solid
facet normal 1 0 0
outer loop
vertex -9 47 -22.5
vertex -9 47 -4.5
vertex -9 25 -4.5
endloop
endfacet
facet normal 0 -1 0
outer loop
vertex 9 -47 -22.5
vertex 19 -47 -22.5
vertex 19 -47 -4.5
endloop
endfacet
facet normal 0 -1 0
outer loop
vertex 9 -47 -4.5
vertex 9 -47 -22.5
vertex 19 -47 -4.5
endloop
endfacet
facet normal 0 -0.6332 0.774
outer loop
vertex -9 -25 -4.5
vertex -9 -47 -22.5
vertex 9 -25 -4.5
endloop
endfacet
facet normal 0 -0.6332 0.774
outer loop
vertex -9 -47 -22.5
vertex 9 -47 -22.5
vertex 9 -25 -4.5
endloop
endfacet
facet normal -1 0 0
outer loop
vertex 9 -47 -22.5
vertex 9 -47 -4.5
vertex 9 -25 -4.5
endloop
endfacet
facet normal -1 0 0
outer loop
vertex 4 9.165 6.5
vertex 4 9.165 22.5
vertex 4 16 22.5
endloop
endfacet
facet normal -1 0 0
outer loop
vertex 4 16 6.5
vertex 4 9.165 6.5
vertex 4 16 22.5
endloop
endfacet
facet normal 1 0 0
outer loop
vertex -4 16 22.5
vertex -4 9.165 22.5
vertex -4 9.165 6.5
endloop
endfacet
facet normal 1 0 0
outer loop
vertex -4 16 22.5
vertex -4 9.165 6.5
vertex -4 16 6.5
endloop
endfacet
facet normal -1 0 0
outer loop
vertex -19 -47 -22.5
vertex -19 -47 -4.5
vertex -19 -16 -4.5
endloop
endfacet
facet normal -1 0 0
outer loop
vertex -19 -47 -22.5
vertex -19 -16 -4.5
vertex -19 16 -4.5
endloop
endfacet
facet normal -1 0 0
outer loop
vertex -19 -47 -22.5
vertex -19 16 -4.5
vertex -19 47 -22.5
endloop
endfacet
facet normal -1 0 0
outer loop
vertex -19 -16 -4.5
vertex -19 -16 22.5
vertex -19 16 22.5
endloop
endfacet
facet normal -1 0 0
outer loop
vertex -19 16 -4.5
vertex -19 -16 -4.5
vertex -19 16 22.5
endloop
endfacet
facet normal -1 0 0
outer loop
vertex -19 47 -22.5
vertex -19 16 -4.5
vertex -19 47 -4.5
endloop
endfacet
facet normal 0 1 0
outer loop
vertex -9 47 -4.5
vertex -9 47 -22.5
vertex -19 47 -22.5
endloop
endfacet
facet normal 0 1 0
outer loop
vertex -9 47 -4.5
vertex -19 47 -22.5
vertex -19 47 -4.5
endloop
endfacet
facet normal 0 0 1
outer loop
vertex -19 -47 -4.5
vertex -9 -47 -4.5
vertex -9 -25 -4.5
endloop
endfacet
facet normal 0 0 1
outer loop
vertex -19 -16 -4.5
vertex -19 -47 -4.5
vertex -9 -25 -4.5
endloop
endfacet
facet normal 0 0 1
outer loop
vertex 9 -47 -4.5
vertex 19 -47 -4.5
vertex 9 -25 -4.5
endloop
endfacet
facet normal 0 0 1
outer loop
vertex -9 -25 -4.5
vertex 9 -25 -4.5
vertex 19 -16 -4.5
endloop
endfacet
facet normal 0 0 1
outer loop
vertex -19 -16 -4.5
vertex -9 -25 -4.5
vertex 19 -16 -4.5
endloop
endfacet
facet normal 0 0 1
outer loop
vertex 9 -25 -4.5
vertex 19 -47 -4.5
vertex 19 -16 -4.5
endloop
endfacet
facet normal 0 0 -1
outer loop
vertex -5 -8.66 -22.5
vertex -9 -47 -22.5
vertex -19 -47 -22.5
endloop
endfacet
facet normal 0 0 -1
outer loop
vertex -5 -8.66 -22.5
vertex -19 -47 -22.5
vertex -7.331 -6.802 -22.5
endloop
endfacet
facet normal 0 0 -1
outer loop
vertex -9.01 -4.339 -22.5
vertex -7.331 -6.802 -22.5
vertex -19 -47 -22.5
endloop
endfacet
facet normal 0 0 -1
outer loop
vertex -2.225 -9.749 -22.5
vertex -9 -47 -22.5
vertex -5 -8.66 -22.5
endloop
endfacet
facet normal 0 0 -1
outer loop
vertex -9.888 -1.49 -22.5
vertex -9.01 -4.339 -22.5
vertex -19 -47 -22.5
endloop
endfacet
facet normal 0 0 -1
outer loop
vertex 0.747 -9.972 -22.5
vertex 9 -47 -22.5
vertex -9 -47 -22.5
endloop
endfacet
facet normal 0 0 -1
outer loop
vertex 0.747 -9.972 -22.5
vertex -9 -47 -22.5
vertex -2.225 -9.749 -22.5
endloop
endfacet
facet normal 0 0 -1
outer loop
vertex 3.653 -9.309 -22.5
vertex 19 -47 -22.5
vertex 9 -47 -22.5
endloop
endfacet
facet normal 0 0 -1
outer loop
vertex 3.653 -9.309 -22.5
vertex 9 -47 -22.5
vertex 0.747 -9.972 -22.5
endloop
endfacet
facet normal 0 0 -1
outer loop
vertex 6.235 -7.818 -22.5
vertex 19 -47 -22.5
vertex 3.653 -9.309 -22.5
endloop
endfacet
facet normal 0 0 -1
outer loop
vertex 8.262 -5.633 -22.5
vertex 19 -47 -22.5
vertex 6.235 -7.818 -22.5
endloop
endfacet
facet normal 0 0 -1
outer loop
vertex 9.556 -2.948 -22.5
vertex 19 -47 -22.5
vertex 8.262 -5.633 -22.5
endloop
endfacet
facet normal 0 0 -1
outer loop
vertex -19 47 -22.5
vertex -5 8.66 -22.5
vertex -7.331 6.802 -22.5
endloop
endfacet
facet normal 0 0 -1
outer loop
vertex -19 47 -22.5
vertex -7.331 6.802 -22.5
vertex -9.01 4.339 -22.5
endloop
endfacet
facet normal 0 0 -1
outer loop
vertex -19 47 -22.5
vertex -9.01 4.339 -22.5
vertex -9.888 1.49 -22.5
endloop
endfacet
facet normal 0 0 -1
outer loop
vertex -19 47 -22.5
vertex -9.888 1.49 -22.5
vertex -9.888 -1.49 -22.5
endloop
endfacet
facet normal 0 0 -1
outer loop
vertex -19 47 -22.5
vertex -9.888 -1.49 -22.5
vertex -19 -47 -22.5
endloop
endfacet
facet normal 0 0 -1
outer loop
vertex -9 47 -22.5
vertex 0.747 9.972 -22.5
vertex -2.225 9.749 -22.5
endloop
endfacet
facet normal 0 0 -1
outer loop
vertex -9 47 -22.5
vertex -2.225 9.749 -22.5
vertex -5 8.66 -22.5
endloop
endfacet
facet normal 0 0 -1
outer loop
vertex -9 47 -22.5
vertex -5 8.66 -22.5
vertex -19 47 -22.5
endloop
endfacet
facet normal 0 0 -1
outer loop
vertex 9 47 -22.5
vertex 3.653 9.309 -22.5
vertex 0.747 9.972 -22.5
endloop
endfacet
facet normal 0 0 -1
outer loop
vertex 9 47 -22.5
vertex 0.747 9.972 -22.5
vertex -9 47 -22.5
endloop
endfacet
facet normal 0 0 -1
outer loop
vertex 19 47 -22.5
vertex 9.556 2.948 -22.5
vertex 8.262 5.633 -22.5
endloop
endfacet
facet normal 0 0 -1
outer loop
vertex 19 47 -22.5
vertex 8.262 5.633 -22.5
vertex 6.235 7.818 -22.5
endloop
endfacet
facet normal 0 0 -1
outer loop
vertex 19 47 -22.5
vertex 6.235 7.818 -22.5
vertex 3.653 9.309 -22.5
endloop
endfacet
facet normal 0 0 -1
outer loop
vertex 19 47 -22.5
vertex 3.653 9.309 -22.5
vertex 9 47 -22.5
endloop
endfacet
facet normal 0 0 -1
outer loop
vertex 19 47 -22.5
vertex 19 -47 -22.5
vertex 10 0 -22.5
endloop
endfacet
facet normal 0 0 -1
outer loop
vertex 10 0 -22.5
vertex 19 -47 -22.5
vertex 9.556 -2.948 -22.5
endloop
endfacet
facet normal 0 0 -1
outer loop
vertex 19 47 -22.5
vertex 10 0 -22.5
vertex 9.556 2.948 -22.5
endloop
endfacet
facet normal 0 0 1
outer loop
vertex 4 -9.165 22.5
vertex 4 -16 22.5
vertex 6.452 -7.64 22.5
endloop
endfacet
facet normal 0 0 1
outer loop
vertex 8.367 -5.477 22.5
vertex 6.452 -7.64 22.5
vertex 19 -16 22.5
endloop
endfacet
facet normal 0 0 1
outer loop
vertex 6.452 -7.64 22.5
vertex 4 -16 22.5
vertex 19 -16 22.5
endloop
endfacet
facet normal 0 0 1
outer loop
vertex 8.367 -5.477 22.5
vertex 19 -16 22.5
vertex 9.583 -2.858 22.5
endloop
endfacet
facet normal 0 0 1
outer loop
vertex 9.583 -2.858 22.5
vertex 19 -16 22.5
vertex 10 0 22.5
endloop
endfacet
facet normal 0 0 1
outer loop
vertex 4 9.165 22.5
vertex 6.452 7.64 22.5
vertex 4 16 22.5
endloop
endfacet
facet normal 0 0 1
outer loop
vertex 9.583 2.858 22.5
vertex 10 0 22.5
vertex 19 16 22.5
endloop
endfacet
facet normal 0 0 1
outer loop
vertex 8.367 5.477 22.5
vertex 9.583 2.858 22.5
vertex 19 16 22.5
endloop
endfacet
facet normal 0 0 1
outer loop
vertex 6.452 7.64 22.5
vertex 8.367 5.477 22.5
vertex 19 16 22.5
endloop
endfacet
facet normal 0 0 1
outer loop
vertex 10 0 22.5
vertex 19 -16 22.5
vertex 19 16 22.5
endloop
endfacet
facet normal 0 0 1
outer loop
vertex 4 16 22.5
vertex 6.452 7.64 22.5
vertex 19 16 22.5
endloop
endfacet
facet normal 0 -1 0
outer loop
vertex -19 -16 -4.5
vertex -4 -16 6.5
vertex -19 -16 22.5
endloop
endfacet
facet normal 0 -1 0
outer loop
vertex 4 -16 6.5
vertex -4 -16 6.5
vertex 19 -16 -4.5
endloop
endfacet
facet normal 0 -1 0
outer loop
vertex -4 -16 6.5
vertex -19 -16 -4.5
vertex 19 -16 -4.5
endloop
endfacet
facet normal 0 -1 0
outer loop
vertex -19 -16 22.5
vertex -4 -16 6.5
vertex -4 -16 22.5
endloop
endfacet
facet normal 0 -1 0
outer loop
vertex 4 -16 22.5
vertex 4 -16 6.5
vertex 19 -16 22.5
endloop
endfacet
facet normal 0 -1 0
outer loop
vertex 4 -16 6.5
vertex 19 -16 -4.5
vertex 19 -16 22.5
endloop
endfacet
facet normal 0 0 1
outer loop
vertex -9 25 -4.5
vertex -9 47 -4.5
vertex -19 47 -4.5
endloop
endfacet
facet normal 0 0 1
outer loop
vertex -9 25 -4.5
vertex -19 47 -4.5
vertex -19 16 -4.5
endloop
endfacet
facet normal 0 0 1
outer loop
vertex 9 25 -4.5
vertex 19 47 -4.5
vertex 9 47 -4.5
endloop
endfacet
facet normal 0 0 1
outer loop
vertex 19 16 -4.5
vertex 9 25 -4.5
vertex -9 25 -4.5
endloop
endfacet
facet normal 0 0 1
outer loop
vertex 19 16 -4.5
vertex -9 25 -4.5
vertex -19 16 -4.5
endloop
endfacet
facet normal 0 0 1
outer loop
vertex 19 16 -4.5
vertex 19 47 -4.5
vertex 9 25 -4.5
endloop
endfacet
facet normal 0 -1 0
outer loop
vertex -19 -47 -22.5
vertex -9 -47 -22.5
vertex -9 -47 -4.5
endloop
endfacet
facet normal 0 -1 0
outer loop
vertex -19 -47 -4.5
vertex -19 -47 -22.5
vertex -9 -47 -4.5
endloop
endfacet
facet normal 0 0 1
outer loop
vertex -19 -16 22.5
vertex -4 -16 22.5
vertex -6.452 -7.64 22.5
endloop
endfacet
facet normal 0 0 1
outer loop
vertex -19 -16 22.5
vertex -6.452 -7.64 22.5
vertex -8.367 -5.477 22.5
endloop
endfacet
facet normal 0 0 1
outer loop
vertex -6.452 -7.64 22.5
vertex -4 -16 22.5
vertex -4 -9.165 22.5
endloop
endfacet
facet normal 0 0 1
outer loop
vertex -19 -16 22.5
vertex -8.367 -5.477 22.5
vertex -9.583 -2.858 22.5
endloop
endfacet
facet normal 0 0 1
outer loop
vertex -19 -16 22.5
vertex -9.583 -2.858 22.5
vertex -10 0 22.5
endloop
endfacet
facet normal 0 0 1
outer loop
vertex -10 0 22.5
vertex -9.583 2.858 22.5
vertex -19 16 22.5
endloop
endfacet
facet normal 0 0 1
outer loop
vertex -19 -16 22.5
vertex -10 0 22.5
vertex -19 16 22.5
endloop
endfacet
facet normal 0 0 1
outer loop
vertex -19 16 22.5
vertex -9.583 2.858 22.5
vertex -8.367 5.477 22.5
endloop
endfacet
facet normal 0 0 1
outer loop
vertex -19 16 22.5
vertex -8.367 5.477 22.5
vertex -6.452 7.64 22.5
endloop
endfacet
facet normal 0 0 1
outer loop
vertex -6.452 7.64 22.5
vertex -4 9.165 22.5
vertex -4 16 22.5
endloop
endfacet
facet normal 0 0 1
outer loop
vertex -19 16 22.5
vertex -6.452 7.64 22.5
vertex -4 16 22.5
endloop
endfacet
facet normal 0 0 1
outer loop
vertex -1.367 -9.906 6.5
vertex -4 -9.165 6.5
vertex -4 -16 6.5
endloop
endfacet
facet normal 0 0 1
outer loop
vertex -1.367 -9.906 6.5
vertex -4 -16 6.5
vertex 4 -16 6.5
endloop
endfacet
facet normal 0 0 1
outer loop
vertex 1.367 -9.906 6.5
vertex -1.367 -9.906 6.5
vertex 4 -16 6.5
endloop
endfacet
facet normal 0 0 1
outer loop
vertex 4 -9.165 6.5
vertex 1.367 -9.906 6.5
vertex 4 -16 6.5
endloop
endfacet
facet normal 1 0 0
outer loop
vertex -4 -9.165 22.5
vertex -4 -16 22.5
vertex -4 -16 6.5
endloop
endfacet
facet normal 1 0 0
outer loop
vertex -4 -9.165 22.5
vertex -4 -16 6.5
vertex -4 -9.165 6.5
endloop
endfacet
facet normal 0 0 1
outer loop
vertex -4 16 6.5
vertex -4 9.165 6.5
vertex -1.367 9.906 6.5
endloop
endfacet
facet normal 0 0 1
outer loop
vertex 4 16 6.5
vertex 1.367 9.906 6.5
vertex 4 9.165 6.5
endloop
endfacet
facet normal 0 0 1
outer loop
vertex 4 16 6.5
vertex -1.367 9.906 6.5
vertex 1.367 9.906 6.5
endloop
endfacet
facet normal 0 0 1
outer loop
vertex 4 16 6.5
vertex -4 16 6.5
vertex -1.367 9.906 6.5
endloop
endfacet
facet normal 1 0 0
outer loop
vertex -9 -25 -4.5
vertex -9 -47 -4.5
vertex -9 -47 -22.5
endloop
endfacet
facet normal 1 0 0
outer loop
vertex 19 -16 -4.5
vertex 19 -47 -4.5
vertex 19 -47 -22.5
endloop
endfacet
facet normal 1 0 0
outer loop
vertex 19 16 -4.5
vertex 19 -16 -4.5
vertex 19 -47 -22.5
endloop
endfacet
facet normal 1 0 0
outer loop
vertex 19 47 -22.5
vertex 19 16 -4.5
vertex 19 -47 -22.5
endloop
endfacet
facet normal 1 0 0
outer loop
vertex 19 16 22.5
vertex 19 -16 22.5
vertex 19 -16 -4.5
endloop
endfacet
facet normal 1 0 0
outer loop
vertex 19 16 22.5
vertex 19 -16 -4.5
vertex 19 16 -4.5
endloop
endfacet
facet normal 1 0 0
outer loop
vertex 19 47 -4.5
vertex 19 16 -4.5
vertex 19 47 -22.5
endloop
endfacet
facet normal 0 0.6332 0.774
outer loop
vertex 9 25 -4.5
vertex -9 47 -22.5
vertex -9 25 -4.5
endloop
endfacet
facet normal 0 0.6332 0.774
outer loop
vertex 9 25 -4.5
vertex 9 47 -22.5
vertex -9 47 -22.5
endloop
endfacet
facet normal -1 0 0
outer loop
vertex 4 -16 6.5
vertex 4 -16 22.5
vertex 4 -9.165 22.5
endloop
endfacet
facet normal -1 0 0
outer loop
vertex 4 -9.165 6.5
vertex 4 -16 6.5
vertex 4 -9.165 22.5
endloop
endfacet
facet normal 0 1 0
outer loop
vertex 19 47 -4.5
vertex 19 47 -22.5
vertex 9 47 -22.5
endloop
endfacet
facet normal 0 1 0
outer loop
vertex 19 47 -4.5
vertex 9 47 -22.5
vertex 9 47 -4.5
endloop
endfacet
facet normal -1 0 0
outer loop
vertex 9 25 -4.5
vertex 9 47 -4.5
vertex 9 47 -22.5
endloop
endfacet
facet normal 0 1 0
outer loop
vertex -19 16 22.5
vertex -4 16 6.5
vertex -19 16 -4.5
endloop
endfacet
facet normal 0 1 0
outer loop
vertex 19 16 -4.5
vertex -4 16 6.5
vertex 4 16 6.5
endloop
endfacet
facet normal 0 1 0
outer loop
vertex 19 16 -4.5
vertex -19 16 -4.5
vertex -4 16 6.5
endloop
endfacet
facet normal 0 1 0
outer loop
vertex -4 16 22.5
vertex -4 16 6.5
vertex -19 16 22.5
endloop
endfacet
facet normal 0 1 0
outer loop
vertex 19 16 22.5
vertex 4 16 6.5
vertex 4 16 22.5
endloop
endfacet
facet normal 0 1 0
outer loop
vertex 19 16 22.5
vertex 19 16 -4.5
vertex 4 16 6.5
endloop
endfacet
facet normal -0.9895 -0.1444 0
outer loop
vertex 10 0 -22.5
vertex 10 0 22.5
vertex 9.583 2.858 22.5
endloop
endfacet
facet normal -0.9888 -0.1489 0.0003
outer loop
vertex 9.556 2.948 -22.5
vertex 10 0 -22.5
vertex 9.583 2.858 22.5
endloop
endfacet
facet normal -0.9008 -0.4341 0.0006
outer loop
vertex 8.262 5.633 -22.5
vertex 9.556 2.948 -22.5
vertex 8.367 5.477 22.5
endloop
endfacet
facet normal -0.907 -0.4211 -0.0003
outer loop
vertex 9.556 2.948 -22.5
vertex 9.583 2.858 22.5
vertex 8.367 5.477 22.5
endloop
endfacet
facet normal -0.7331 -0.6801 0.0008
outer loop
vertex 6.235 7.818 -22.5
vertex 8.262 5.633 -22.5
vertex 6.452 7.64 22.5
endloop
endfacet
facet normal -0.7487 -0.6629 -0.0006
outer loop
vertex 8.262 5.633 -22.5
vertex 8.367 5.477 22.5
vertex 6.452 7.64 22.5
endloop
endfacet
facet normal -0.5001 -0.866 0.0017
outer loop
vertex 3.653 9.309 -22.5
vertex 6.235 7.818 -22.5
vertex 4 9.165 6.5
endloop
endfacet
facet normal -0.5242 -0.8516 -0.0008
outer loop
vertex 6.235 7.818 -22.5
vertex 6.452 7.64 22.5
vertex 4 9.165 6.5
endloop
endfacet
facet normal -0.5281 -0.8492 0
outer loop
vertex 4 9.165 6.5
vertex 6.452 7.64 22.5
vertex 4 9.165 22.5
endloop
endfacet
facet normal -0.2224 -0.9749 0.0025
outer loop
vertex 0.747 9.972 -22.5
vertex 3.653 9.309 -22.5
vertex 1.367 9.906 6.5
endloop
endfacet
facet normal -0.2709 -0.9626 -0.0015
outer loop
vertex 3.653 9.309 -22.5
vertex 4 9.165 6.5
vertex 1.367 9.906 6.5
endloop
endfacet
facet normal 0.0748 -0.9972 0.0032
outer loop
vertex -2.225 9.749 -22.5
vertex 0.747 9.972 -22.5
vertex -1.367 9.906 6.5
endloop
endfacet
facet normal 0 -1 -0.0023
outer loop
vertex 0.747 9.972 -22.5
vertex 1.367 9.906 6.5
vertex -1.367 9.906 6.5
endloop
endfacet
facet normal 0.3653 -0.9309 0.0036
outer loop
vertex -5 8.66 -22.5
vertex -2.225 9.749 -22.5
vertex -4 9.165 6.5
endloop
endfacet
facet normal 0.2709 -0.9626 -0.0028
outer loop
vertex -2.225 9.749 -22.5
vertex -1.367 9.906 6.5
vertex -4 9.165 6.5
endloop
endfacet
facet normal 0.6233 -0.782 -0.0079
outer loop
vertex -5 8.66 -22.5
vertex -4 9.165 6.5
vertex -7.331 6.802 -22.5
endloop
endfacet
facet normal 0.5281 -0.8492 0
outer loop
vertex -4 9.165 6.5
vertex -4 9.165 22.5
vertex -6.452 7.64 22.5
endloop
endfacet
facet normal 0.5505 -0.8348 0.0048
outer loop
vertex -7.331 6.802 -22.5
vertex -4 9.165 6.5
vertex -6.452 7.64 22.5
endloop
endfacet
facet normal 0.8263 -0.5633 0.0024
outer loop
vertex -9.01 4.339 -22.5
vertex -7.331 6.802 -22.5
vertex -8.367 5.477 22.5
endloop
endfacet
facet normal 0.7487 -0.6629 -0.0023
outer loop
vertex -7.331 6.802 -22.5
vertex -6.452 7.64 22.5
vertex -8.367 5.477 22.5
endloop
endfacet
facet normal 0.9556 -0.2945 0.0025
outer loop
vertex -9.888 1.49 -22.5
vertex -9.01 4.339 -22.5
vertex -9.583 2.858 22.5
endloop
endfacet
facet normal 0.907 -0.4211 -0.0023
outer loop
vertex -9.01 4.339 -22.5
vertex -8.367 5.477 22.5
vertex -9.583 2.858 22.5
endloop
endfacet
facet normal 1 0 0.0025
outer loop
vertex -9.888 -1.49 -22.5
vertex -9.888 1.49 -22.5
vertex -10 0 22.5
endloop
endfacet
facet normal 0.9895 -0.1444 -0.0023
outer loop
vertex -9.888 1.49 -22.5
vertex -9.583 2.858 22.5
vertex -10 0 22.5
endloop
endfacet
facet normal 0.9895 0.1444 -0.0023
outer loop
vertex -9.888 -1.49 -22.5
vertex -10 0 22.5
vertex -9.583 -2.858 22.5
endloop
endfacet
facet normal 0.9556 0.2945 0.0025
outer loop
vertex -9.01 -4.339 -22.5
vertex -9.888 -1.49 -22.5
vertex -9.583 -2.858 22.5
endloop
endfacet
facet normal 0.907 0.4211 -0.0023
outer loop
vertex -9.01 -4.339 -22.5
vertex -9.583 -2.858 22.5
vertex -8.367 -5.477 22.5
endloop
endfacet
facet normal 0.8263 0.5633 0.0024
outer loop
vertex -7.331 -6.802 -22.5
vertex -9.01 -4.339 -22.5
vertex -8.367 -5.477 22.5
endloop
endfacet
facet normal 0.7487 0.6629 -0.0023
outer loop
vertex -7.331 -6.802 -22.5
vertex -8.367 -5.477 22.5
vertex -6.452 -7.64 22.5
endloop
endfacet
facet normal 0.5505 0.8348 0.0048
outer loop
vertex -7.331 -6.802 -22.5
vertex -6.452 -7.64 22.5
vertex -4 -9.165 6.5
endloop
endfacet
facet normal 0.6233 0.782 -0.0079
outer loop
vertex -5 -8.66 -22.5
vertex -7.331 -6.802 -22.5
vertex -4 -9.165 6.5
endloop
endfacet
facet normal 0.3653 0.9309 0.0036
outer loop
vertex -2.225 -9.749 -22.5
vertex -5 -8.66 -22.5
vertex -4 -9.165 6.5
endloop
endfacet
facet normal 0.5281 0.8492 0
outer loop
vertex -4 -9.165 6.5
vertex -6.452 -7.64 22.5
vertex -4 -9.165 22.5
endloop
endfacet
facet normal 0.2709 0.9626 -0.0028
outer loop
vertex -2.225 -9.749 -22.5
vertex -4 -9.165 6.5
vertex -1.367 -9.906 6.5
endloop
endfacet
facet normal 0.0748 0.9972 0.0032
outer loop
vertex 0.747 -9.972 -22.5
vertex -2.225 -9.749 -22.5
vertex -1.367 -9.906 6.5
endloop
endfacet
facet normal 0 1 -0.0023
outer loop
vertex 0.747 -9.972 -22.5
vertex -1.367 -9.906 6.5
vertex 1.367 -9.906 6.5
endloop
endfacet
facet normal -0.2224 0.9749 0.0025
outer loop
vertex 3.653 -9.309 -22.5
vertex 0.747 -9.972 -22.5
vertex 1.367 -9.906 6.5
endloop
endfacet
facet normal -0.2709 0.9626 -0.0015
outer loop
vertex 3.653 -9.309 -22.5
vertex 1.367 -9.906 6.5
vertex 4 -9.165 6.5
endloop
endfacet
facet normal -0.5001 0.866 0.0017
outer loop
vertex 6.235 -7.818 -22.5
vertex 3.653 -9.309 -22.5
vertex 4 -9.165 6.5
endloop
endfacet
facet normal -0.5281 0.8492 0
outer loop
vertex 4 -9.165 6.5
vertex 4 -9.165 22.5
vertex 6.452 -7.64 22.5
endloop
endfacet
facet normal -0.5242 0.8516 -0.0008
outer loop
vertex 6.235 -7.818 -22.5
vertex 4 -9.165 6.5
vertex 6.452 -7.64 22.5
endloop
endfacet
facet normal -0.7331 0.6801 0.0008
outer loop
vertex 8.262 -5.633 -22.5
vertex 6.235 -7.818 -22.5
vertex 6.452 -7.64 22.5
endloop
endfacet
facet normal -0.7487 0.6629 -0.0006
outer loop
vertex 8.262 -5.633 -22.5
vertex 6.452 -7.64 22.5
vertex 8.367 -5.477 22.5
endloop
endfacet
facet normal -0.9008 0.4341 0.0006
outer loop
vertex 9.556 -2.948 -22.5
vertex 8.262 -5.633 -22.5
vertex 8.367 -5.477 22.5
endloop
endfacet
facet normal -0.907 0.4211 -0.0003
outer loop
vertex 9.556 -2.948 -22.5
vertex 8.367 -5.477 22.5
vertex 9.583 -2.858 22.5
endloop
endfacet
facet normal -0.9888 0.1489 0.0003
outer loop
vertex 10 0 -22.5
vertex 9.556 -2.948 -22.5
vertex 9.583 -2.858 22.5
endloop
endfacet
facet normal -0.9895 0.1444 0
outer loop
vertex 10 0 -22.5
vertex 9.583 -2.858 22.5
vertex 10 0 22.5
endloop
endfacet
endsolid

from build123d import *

# Parameters (mm, degrees)
F0_W     = 94
F0_H     = 45
F1_DEPTH = 19
F2_W     = 31
F2_H     = 27
F3_DEPTH = 38.001
F4_R     = 10
F5_DEPTH = 45.001
F6_W     = 8
F6_H     = 32
F7_DEPTH = 16
F9_DEPTH = 9


# Not quite as in the source:
# - a pattern or mirror of a feature is missing from the dataset's text; its kind, count and spacing are read off the source's solid


with BuildPart() as f1:
    # F0 (on Right) → F1 (new body, symmetric)
    with BuildSketch(Plane.YZ):
        Rectangle(F0_W, F0_H)
    extrude(amount=F1_DEPTH, both=True)

    # F2 (on face) → F3 (cut, through all)
    with BuildSketch(Plane.YZ.offset(19)):
        with Locations((-31.5, 9)):
            Rectangle(F2_W, F2_H)
    f3 = extrude(amount=-F3_DEPTH, mode=Mode.SUBTRACT)

    # F3_copies: F3 across plane
    add(f3.mirror(Plane.ZX), mode=Mode.SUBTRACT)

    # F4 (on face) → F5 (cut, through all)
    with BuildSketch(Plane.XY.offset(22.5)):
        Circle(F4_R)
    extrude(amount=-F5_DEPTH, mode=Mode.SUBTRACT)

    # F6 (on face) → F7 (cut)
    with BuildSketch(Plane.XY.offset(22.5)):
        Rectangle(F6_W, F6_H)
    extrude(amount=-F7_DEPTH, mode=Mode.SUBTRACT)

    # F8 (on Right) → F9 (cut, symmetric)
    with BuildSketch(Plane.YZ):
        Polygon((-25, -4.5), (-47, -4.5), (-47, -22.5), align=None)
    f9 = extrude(amount=F9_DEPTH, both=True, mode=Mode.SUBTRACT)

    # F9_copies: F9 across plane
    add(f9.mirror(Plane.ZX), mode=Mode.SUBTRACT)


solid = f1.part
